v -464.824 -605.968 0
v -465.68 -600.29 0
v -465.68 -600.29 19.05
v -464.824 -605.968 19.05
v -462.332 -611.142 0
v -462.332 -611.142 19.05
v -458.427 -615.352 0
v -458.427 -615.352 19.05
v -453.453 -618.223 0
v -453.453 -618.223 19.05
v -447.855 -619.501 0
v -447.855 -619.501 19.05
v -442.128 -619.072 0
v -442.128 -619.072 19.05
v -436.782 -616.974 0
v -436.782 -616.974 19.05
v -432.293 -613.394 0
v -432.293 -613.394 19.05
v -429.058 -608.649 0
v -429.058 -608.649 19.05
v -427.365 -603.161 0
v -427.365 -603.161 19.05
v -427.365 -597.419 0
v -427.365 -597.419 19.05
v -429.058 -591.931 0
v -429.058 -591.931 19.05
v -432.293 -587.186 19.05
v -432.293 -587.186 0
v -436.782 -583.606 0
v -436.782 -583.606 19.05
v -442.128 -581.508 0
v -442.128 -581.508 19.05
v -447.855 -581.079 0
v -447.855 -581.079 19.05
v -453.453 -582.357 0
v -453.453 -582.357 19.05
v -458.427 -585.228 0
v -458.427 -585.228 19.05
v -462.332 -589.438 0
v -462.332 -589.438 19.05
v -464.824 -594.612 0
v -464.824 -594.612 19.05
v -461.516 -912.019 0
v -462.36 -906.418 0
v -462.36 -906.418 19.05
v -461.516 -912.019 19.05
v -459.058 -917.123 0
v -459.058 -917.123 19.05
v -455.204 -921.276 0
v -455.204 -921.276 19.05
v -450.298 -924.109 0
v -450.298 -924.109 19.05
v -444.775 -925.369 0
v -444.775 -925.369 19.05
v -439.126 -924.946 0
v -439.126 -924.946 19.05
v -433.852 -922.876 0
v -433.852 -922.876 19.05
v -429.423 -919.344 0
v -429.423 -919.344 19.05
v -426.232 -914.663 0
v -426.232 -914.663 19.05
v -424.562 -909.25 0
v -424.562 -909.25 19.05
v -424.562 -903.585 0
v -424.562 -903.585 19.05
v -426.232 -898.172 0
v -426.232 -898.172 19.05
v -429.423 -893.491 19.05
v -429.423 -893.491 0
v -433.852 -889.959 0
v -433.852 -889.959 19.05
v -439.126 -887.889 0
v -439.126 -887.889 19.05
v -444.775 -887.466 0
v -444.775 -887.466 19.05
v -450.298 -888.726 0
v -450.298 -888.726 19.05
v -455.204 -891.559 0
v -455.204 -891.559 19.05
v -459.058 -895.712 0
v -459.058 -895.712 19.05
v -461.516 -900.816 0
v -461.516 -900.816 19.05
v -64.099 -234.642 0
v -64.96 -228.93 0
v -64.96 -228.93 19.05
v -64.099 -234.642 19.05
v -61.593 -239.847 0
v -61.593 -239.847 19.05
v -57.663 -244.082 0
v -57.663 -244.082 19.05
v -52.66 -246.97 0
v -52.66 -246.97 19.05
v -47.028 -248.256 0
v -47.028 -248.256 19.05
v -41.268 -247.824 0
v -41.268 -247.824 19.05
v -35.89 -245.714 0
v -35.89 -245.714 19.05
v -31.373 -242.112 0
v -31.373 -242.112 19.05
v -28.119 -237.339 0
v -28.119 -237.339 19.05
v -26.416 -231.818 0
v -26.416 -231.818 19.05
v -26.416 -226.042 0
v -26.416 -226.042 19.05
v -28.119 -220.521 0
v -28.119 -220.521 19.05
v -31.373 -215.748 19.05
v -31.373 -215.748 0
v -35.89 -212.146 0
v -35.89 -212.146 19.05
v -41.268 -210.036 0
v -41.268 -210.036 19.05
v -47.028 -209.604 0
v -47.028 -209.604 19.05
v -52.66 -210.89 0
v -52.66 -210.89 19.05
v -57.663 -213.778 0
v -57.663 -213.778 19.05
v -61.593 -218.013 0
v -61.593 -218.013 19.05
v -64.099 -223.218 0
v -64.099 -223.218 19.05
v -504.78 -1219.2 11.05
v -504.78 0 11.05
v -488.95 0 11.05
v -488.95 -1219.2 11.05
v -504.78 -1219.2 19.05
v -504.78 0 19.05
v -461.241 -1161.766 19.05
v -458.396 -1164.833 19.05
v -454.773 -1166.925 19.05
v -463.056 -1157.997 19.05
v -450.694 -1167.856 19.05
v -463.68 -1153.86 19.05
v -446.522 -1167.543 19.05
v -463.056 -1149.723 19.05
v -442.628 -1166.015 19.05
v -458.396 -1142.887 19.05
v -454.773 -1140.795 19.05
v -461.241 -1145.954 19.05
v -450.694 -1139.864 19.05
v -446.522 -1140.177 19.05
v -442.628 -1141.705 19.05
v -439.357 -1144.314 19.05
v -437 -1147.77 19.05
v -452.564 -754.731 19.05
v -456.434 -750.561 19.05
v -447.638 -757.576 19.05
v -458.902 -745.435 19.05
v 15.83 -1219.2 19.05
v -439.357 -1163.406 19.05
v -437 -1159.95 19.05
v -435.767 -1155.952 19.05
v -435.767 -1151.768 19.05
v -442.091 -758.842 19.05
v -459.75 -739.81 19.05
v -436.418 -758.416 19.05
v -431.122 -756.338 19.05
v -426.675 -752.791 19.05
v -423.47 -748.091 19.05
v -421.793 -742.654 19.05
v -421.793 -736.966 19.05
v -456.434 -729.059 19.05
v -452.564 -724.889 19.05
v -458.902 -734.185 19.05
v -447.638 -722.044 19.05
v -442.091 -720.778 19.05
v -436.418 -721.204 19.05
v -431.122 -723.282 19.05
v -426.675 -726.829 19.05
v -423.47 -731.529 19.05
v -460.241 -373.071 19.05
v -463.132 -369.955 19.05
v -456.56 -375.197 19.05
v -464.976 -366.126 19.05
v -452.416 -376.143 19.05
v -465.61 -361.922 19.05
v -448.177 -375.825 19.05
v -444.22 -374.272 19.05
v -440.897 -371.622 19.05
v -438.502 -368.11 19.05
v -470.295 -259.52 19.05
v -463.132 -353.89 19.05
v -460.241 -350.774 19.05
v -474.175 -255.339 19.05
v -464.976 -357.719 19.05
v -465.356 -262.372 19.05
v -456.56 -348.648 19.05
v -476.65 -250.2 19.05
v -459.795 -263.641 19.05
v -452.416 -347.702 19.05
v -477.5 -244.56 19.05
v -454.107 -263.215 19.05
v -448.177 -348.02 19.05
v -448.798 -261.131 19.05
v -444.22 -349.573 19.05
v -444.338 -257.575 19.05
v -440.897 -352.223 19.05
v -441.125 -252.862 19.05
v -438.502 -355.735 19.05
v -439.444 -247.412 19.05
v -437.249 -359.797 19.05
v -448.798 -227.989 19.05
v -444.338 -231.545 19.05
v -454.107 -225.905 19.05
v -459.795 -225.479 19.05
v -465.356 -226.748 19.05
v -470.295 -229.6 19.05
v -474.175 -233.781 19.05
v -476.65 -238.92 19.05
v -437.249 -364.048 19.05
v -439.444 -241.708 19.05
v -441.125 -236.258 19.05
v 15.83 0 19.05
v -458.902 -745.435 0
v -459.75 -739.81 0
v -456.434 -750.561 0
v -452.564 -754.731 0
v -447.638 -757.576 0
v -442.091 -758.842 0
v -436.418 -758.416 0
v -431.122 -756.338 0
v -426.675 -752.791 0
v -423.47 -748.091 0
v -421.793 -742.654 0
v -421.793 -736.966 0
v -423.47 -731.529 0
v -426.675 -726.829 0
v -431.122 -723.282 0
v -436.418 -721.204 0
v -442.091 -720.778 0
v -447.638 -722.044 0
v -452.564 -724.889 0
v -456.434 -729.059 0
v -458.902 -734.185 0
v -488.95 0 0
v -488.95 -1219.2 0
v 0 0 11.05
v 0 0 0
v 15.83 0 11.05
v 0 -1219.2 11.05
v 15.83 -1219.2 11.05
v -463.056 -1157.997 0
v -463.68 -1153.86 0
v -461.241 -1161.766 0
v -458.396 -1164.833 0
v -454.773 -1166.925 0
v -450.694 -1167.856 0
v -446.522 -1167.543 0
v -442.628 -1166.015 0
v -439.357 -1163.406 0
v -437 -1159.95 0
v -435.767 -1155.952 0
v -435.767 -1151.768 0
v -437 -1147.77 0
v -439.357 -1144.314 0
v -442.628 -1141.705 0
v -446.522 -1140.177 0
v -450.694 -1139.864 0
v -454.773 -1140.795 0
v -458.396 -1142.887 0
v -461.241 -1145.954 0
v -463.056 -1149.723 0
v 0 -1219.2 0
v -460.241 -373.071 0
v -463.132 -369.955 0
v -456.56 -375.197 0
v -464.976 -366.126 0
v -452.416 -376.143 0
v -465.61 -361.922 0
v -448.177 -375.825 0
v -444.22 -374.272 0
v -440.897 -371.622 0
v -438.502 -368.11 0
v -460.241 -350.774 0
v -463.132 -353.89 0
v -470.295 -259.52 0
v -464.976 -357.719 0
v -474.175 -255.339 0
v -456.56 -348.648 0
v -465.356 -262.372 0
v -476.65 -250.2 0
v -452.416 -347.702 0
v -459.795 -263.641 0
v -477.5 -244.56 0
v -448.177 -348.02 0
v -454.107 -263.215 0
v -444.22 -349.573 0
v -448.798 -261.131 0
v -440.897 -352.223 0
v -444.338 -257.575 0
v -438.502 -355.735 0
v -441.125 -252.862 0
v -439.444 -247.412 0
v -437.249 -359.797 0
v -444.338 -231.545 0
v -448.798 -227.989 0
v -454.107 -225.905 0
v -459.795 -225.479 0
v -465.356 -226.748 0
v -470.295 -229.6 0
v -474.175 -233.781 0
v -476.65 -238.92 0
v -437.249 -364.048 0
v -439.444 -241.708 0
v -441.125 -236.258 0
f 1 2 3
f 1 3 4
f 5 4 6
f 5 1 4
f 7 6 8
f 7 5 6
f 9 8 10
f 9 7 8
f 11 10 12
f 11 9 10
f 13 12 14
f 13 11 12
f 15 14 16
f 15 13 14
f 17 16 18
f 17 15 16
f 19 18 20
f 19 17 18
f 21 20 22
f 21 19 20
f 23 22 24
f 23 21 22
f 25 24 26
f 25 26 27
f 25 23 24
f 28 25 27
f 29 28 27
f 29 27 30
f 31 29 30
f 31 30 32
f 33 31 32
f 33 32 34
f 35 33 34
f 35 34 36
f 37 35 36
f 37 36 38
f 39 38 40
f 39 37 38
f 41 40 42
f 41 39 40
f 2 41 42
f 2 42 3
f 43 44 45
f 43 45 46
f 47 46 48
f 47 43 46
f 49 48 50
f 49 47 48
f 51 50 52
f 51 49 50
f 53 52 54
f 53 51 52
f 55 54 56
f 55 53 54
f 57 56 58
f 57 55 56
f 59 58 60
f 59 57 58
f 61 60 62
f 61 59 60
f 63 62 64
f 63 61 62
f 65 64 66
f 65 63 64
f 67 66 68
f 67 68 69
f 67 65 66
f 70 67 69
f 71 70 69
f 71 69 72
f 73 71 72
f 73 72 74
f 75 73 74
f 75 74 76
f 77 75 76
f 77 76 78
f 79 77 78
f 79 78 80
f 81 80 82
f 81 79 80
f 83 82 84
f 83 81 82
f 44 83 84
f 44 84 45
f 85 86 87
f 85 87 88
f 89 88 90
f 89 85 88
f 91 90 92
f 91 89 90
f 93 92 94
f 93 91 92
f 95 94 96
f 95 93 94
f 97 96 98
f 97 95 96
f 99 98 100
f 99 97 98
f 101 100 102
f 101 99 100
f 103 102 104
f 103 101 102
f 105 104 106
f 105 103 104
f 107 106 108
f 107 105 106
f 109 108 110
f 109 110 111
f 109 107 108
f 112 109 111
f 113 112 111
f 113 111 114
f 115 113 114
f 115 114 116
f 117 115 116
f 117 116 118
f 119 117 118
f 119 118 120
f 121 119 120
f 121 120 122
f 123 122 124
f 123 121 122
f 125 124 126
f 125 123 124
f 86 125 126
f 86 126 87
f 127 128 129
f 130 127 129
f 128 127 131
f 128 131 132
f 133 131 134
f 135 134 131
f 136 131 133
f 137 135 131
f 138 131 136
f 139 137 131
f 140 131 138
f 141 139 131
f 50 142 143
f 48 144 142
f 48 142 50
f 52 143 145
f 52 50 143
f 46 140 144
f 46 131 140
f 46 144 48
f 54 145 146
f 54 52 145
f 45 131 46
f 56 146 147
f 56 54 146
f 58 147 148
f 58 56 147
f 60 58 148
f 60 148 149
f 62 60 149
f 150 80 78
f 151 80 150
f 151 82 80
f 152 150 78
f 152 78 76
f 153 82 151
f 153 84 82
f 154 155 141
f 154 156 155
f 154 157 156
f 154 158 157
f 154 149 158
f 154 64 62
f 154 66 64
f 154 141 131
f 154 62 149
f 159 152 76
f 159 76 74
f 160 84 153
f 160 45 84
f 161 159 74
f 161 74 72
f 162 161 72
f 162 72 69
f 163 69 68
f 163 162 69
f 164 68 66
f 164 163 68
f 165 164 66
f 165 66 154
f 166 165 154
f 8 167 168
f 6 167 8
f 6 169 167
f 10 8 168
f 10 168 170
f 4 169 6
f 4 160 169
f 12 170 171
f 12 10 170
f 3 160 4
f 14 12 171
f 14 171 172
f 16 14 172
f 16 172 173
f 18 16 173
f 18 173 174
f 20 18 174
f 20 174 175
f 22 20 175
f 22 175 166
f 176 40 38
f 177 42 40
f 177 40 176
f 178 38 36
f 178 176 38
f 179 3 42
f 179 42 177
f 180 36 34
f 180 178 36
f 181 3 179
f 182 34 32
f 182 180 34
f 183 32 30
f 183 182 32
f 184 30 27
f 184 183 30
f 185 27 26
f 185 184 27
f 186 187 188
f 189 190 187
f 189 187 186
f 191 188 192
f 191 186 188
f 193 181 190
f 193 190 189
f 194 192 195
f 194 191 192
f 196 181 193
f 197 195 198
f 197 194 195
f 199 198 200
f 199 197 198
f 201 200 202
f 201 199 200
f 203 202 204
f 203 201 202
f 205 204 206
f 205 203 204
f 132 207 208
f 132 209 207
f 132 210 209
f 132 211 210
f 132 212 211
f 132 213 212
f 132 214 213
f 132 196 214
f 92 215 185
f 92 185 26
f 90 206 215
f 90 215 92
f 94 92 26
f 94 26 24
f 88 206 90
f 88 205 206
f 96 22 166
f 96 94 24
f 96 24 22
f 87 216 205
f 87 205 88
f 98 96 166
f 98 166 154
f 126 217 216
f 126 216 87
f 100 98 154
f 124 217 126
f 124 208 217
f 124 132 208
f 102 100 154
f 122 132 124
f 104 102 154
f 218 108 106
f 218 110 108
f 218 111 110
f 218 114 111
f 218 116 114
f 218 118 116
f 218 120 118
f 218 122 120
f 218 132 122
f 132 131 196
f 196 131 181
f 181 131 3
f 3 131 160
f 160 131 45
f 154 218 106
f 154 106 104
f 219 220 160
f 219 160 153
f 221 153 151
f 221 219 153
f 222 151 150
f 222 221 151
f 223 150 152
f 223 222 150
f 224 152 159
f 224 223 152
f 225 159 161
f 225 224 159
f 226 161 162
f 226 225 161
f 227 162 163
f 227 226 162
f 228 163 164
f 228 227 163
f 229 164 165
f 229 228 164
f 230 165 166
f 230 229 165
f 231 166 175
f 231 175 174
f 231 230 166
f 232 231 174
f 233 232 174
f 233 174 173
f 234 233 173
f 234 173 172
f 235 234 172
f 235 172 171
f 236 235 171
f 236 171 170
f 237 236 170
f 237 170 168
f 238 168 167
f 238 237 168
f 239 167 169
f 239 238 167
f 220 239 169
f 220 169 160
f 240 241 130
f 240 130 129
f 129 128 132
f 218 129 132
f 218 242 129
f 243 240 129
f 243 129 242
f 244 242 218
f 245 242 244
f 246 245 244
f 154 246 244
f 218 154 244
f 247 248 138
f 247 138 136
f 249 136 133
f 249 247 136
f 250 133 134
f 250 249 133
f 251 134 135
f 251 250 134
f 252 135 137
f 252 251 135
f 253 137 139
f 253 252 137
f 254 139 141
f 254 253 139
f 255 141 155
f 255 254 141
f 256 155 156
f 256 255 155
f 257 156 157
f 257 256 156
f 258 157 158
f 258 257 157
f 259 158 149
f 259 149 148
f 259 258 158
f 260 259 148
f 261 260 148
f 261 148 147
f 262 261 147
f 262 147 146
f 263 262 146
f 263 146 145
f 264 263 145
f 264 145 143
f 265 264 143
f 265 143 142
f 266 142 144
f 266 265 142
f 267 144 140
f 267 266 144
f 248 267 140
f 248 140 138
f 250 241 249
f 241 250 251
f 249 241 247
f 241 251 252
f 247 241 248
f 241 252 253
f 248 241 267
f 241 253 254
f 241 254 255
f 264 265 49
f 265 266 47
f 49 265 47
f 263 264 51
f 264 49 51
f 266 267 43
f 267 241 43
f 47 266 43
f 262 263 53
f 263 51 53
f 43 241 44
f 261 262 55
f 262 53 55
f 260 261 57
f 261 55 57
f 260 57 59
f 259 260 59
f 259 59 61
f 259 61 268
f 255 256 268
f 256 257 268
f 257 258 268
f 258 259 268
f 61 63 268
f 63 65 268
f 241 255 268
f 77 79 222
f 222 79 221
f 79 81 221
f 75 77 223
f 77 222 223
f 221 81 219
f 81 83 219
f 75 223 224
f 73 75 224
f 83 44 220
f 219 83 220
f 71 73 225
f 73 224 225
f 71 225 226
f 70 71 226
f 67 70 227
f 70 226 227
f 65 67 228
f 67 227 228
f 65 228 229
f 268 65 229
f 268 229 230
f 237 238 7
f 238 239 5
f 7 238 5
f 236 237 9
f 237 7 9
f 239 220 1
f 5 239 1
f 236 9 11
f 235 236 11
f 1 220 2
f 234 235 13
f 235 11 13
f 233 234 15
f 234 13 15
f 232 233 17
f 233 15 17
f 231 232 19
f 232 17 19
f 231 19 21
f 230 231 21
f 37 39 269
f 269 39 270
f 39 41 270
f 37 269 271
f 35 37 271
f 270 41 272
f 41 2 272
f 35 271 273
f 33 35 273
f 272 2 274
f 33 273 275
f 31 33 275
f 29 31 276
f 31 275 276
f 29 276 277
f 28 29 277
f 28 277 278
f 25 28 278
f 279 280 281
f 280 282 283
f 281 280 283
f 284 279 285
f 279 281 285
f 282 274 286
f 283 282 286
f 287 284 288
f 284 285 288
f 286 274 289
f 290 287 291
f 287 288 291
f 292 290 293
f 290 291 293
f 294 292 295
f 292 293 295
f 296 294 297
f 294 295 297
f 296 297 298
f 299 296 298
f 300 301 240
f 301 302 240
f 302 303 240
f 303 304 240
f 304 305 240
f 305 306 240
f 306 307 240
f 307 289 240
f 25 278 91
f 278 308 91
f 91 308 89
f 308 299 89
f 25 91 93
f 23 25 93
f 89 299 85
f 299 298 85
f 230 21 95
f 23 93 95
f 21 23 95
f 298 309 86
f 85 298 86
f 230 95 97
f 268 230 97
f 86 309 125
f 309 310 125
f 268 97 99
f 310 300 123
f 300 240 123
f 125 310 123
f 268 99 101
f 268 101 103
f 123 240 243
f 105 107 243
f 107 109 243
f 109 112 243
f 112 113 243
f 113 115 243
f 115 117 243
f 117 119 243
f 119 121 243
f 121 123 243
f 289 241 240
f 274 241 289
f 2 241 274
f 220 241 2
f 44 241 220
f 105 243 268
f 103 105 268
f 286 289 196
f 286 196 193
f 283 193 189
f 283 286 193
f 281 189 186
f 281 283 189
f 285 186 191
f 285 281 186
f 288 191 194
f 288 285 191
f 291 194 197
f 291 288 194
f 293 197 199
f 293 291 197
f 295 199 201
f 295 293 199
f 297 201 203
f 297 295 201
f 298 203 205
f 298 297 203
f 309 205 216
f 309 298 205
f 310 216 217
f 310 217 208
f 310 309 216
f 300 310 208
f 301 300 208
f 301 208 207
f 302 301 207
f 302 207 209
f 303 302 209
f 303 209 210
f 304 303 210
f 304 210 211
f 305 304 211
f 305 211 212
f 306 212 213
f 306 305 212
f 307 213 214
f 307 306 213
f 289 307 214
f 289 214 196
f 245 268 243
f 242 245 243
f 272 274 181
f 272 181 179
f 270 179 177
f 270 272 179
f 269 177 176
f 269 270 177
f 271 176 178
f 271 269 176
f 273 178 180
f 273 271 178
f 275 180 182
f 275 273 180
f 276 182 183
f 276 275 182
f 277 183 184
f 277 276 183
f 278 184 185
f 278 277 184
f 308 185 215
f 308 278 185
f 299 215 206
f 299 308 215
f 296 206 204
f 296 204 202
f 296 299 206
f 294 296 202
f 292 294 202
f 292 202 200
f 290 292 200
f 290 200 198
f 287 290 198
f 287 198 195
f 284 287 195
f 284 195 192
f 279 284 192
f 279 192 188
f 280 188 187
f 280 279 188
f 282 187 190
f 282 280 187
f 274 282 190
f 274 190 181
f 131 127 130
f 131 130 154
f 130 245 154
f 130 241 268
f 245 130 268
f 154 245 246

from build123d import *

# Parameters (mm, degrees)
SKETCH1_W           = 520.61
SKETCH1_H           = 1219.2
SKETCH1_R           = 14.035
SKETCH1_R_2         = 19.005
SKETCH1_R_3         = 19.085
SKETCH1_R_4         = 19.265
SKETCH1_R_5         = 14.26
SKETCH1_R_6         = 19.135
SKETCH1_R_7         = 19.38
BOSS_EXTRUDE1_DEPTH = 19.05
SKETCH1_3_W         = 15.83
SKETCH1_3_H         = 1219.2
CUT_EXTRUDE1_DEPTH  = 11.05


with BuildPart() as part:
    # Sketch1 → Boss-Extrude1 (new body)
    with BuildSketch(Plane.XY):
        with Locations((-244.475, -609.6)):
            Rectangle(SKETCH1_W, SKETCH1_H)
        with Locations((-449.645, -1153.86)):
            Circle(SKETCH1_R, mode=Mode.SUBTRACT)
        with Locations((-443.355, -906.4175)):
            Circle(SKETCH1_R_2, mode=Mode.SUBTRACT)
        with Locations((-440.665, -739.81)):
            Circle(SKETCH1_R_3, mode=Mode.SUBTRACT)
        with Locations((-446.415, -600.29)):
            Circle(SKETCH1_R_4, mode=Mode.SUBTRACT)
        with Locations((-451.35, -361.9225)):
            Circle(SKETCH1_R_5, mode=Mode.SUBTRACT)
        with Locations((-458.365, -244.56)):
            Circle(SKETCH1_R_6, mode=Mode.SUBTRACT)
        with Locations((-45.58, -228.93)):
            Circle(SKETCH1_R_7, mode=Mode.SUBTRACT)
    extrude(amount=BOSS_EXTRUDE1_DEPTH)

    # Sketch1<3> → Cut-Extrude1 (cut)
    with BuildSketch(Plane.XY):
        with Locations((7.915, -609.6)):
            Rectangle(SKETCH1_3_W, SKETCH1_3_H)
        with Locations((-496.865, -609.6)):
            Rectangle(SKETCH1_3_W, SKETCH1_3_H)
    extrude(amount=CUT_EXTRUDE1_DEPTH, mode=Mode.SUBTRACT)


solid = part.part
